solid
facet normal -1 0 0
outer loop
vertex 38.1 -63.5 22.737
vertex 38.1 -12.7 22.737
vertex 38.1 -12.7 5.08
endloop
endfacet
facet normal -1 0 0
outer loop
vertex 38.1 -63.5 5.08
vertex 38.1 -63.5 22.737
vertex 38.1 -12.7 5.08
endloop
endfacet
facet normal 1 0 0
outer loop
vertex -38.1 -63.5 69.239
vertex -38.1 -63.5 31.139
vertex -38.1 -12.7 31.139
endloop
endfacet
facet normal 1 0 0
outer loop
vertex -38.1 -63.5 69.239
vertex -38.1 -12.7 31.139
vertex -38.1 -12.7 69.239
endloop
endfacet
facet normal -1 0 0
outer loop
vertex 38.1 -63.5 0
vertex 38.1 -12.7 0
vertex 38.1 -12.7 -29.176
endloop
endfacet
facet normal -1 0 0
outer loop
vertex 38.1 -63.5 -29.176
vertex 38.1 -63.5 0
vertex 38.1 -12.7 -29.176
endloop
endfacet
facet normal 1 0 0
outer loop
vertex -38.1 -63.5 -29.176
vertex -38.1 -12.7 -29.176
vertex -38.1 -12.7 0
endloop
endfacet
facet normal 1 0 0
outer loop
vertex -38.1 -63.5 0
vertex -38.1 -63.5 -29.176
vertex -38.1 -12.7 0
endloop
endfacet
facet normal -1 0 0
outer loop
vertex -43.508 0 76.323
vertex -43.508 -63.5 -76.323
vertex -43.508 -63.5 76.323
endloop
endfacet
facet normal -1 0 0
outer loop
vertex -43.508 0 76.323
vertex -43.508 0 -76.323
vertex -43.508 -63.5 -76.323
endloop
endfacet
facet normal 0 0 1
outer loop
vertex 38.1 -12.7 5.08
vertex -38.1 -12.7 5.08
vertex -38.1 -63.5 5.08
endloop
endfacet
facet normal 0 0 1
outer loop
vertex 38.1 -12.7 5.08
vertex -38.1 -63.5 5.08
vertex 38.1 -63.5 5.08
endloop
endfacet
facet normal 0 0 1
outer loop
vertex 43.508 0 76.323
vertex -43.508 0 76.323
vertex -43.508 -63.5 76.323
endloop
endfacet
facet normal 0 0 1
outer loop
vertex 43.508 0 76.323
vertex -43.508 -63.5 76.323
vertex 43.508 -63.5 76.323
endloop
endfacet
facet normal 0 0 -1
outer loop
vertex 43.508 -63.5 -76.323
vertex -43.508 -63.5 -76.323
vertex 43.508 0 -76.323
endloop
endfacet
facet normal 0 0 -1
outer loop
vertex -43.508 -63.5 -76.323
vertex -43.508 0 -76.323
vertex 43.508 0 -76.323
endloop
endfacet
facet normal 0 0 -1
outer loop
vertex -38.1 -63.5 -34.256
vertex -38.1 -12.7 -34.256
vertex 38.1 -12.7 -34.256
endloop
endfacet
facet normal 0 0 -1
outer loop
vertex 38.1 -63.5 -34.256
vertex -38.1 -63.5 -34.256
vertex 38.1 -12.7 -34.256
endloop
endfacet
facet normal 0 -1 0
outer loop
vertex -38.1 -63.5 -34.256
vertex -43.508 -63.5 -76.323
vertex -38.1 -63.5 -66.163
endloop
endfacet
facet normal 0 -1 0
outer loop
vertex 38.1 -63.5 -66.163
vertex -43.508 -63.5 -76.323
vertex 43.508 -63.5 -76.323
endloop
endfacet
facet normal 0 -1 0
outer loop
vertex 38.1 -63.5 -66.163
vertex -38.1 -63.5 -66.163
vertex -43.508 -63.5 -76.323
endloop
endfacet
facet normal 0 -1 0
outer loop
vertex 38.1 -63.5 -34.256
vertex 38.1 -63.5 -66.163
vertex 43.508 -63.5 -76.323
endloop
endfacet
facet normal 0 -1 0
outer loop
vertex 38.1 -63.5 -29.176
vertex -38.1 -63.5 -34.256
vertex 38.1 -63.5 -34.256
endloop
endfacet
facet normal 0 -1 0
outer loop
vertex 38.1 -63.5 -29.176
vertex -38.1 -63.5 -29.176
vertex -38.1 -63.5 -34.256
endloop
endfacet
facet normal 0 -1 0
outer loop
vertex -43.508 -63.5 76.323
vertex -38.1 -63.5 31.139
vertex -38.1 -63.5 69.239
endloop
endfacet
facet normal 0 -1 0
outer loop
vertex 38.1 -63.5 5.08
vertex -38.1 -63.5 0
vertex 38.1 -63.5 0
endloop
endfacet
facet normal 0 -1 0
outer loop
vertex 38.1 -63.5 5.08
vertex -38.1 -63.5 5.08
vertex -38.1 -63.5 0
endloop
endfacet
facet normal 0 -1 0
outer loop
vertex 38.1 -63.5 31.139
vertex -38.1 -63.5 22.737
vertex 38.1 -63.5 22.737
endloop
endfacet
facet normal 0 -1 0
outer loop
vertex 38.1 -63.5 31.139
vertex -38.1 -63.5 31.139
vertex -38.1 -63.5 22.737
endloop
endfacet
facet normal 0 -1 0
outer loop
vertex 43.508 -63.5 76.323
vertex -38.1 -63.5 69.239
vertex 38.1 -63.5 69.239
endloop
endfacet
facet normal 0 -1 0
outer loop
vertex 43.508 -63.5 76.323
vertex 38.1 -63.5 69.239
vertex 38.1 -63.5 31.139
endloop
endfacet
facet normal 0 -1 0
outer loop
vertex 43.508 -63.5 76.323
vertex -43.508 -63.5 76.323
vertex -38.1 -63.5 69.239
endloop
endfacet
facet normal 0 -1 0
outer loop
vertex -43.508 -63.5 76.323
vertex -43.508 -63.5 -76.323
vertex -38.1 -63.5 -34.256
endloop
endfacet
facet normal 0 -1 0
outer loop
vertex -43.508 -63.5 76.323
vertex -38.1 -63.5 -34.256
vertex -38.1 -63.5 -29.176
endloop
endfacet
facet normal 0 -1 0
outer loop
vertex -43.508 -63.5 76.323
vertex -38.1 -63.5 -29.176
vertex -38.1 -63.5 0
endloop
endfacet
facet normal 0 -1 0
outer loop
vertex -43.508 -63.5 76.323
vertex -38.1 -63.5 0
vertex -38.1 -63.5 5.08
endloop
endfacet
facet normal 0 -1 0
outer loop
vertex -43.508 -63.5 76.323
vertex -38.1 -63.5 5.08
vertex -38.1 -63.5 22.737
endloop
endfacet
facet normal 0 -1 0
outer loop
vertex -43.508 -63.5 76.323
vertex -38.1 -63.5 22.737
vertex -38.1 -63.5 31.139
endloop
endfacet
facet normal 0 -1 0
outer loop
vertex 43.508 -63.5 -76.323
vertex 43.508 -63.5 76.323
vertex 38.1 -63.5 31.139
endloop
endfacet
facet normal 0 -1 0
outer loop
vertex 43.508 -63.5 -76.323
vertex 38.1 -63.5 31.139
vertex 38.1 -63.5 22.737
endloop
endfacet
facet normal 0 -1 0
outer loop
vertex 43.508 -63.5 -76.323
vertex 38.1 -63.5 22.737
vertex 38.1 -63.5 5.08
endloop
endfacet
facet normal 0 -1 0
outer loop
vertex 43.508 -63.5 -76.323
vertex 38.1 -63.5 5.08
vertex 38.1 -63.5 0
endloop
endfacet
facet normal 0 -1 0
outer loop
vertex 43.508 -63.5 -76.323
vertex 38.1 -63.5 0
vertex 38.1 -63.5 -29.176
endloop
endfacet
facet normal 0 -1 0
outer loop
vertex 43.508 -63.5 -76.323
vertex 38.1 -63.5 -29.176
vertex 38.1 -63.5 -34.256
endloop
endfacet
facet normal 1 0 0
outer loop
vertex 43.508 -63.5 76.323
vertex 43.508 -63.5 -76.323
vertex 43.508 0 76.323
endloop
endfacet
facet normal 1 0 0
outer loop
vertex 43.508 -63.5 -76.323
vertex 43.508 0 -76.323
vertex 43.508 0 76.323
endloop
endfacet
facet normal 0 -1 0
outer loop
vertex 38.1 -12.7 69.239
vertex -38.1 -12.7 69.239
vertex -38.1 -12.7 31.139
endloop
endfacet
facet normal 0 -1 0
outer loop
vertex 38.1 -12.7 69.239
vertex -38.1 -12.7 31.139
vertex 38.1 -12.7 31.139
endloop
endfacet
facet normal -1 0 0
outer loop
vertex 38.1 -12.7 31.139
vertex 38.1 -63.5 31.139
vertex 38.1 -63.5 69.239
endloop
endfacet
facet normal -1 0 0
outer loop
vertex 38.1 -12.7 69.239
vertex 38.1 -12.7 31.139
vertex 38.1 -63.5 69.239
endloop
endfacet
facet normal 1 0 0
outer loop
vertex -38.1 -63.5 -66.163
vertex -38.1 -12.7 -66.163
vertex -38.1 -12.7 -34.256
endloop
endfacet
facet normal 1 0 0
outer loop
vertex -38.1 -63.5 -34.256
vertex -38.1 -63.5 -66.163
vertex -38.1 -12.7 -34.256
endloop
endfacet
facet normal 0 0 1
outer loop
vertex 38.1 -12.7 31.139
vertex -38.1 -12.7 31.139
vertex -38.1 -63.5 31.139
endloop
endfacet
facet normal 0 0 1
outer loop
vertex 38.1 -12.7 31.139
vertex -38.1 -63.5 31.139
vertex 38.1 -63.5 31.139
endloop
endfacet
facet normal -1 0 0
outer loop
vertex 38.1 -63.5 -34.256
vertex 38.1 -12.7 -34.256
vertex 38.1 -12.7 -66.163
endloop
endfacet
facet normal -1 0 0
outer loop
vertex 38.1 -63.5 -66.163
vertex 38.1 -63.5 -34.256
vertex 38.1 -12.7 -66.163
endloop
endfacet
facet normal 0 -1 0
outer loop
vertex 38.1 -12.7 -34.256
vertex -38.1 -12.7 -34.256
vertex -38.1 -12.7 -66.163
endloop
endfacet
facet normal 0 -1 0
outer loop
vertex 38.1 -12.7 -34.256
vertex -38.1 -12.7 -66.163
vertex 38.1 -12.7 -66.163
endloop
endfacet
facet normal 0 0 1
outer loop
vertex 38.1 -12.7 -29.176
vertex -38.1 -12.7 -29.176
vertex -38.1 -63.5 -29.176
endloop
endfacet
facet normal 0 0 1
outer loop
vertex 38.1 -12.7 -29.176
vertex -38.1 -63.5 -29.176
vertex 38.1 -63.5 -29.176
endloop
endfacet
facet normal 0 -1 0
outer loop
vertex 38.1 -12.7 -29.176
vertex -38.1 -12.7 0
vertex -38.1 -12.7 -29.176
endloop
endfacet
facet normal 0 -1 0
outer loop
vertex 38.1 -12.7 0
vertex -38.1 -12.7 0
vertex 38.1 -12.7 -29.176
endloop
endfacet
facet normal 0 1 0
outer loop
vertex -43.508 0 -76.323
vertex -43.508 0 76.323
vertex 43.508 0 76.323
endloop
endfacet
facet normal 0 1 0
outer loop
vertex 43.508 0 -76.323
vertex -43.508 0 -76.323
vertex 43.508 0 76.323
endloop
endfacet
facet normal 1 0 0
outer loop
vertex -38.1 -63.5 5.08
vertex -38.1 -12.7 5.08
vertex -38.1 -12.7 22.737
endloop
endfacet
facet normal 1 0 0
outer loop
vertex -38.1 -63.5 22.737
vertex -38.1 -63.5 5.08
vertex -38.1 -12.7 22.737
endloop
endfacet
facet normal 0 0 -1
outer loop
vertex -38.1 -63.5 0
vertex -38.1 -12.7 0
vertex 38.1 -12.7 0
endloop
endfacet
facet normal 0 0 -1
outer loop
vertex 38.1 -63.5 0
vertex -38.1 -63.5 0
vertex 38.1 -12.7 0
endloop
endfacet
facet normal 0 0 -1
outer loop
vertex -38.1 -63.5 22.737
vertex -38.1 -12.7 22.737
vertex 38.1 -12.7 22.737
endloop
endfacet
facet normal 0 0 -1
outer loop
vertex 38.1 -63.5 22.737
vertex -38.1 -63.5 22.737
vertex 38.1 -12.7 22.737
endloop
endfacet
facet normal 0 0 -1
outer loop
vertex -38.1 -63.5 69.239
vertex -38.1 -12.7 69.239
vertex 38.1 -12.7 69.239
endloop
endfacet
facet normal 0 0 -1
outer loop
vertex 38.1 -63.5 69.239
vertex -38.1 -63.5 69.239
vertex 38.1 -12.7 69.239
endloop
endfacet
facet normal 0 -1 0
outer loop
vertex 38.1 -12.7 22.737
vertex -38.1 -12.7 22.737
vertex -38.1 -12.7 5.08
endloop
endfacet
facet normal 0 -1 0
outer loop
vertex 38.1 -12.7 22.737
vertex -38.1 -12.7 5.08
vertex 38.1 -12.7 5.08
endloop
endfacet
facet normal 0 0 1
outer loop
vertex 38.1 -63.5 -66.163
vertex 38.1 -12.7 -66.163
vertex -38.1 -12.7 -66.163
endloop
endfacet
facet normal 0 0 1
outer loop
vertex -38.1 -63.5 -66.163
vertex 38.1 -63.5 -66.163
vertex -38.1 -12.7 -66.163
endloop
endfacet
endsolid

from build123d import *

# Parameters (mm, degrees)
F0_W     = 87.015488
F0_H     = 152.645812
F1_DEPTH = 12.7
F2_W     = 87.015488
F2_H     = 152.645812
F2_W_2   = 76.2
F2_H_2   = 38.1
F3_DEPTH = 50.8
F2_H_3   = 5.08
F4_DEPTH = 50.8


with BuildPart() as f1:
    # F0 (on Front) → F1 (new body)
    with BuildSketch(Plane.XZ):
        Rectangle(F0_W, F0_H)
    extrude(amount=F1_DEPTH)

    # F2 (on face) → F3 (join)
    with BuildSketch(Plane.XZ.offset(12.7)):
        Rectangle(F2_W, F2_H)
        Polygon((-38.1, 22.737094), (38.1, 22.737094), (38.1, 5.08), (38.1, 0), (38.1, -29.176182), (38.1, -34.256182), (38.1, -66.162906), (-38.1, -66.162906), (-38.1, -34.256182), (-38.1, -29.176182), (-38.1, 0), (-38.1, 5.08), align=None, mode=Mode.SUBTRACT)
        with Locations((0, 50.189414)):
            Rectangle(F2_W_2, F2_H_2, mode=Mode.SUBTRACT)
    extrude(amount=F3_DEPTH)

    # F2 (on face) → F4 (join)
    with BuildSketch(Plane.XZ.offset(12.7)):
        with Locations((0, 2.54)):
            Rectangle(F2_W_2, F2_H_3)
        with Locations((0, -31.716182)):
            Rectangle(F2_W_2, F2_H_3)
    extrude(amount=F4_DEPTH)


solid = f1.part
